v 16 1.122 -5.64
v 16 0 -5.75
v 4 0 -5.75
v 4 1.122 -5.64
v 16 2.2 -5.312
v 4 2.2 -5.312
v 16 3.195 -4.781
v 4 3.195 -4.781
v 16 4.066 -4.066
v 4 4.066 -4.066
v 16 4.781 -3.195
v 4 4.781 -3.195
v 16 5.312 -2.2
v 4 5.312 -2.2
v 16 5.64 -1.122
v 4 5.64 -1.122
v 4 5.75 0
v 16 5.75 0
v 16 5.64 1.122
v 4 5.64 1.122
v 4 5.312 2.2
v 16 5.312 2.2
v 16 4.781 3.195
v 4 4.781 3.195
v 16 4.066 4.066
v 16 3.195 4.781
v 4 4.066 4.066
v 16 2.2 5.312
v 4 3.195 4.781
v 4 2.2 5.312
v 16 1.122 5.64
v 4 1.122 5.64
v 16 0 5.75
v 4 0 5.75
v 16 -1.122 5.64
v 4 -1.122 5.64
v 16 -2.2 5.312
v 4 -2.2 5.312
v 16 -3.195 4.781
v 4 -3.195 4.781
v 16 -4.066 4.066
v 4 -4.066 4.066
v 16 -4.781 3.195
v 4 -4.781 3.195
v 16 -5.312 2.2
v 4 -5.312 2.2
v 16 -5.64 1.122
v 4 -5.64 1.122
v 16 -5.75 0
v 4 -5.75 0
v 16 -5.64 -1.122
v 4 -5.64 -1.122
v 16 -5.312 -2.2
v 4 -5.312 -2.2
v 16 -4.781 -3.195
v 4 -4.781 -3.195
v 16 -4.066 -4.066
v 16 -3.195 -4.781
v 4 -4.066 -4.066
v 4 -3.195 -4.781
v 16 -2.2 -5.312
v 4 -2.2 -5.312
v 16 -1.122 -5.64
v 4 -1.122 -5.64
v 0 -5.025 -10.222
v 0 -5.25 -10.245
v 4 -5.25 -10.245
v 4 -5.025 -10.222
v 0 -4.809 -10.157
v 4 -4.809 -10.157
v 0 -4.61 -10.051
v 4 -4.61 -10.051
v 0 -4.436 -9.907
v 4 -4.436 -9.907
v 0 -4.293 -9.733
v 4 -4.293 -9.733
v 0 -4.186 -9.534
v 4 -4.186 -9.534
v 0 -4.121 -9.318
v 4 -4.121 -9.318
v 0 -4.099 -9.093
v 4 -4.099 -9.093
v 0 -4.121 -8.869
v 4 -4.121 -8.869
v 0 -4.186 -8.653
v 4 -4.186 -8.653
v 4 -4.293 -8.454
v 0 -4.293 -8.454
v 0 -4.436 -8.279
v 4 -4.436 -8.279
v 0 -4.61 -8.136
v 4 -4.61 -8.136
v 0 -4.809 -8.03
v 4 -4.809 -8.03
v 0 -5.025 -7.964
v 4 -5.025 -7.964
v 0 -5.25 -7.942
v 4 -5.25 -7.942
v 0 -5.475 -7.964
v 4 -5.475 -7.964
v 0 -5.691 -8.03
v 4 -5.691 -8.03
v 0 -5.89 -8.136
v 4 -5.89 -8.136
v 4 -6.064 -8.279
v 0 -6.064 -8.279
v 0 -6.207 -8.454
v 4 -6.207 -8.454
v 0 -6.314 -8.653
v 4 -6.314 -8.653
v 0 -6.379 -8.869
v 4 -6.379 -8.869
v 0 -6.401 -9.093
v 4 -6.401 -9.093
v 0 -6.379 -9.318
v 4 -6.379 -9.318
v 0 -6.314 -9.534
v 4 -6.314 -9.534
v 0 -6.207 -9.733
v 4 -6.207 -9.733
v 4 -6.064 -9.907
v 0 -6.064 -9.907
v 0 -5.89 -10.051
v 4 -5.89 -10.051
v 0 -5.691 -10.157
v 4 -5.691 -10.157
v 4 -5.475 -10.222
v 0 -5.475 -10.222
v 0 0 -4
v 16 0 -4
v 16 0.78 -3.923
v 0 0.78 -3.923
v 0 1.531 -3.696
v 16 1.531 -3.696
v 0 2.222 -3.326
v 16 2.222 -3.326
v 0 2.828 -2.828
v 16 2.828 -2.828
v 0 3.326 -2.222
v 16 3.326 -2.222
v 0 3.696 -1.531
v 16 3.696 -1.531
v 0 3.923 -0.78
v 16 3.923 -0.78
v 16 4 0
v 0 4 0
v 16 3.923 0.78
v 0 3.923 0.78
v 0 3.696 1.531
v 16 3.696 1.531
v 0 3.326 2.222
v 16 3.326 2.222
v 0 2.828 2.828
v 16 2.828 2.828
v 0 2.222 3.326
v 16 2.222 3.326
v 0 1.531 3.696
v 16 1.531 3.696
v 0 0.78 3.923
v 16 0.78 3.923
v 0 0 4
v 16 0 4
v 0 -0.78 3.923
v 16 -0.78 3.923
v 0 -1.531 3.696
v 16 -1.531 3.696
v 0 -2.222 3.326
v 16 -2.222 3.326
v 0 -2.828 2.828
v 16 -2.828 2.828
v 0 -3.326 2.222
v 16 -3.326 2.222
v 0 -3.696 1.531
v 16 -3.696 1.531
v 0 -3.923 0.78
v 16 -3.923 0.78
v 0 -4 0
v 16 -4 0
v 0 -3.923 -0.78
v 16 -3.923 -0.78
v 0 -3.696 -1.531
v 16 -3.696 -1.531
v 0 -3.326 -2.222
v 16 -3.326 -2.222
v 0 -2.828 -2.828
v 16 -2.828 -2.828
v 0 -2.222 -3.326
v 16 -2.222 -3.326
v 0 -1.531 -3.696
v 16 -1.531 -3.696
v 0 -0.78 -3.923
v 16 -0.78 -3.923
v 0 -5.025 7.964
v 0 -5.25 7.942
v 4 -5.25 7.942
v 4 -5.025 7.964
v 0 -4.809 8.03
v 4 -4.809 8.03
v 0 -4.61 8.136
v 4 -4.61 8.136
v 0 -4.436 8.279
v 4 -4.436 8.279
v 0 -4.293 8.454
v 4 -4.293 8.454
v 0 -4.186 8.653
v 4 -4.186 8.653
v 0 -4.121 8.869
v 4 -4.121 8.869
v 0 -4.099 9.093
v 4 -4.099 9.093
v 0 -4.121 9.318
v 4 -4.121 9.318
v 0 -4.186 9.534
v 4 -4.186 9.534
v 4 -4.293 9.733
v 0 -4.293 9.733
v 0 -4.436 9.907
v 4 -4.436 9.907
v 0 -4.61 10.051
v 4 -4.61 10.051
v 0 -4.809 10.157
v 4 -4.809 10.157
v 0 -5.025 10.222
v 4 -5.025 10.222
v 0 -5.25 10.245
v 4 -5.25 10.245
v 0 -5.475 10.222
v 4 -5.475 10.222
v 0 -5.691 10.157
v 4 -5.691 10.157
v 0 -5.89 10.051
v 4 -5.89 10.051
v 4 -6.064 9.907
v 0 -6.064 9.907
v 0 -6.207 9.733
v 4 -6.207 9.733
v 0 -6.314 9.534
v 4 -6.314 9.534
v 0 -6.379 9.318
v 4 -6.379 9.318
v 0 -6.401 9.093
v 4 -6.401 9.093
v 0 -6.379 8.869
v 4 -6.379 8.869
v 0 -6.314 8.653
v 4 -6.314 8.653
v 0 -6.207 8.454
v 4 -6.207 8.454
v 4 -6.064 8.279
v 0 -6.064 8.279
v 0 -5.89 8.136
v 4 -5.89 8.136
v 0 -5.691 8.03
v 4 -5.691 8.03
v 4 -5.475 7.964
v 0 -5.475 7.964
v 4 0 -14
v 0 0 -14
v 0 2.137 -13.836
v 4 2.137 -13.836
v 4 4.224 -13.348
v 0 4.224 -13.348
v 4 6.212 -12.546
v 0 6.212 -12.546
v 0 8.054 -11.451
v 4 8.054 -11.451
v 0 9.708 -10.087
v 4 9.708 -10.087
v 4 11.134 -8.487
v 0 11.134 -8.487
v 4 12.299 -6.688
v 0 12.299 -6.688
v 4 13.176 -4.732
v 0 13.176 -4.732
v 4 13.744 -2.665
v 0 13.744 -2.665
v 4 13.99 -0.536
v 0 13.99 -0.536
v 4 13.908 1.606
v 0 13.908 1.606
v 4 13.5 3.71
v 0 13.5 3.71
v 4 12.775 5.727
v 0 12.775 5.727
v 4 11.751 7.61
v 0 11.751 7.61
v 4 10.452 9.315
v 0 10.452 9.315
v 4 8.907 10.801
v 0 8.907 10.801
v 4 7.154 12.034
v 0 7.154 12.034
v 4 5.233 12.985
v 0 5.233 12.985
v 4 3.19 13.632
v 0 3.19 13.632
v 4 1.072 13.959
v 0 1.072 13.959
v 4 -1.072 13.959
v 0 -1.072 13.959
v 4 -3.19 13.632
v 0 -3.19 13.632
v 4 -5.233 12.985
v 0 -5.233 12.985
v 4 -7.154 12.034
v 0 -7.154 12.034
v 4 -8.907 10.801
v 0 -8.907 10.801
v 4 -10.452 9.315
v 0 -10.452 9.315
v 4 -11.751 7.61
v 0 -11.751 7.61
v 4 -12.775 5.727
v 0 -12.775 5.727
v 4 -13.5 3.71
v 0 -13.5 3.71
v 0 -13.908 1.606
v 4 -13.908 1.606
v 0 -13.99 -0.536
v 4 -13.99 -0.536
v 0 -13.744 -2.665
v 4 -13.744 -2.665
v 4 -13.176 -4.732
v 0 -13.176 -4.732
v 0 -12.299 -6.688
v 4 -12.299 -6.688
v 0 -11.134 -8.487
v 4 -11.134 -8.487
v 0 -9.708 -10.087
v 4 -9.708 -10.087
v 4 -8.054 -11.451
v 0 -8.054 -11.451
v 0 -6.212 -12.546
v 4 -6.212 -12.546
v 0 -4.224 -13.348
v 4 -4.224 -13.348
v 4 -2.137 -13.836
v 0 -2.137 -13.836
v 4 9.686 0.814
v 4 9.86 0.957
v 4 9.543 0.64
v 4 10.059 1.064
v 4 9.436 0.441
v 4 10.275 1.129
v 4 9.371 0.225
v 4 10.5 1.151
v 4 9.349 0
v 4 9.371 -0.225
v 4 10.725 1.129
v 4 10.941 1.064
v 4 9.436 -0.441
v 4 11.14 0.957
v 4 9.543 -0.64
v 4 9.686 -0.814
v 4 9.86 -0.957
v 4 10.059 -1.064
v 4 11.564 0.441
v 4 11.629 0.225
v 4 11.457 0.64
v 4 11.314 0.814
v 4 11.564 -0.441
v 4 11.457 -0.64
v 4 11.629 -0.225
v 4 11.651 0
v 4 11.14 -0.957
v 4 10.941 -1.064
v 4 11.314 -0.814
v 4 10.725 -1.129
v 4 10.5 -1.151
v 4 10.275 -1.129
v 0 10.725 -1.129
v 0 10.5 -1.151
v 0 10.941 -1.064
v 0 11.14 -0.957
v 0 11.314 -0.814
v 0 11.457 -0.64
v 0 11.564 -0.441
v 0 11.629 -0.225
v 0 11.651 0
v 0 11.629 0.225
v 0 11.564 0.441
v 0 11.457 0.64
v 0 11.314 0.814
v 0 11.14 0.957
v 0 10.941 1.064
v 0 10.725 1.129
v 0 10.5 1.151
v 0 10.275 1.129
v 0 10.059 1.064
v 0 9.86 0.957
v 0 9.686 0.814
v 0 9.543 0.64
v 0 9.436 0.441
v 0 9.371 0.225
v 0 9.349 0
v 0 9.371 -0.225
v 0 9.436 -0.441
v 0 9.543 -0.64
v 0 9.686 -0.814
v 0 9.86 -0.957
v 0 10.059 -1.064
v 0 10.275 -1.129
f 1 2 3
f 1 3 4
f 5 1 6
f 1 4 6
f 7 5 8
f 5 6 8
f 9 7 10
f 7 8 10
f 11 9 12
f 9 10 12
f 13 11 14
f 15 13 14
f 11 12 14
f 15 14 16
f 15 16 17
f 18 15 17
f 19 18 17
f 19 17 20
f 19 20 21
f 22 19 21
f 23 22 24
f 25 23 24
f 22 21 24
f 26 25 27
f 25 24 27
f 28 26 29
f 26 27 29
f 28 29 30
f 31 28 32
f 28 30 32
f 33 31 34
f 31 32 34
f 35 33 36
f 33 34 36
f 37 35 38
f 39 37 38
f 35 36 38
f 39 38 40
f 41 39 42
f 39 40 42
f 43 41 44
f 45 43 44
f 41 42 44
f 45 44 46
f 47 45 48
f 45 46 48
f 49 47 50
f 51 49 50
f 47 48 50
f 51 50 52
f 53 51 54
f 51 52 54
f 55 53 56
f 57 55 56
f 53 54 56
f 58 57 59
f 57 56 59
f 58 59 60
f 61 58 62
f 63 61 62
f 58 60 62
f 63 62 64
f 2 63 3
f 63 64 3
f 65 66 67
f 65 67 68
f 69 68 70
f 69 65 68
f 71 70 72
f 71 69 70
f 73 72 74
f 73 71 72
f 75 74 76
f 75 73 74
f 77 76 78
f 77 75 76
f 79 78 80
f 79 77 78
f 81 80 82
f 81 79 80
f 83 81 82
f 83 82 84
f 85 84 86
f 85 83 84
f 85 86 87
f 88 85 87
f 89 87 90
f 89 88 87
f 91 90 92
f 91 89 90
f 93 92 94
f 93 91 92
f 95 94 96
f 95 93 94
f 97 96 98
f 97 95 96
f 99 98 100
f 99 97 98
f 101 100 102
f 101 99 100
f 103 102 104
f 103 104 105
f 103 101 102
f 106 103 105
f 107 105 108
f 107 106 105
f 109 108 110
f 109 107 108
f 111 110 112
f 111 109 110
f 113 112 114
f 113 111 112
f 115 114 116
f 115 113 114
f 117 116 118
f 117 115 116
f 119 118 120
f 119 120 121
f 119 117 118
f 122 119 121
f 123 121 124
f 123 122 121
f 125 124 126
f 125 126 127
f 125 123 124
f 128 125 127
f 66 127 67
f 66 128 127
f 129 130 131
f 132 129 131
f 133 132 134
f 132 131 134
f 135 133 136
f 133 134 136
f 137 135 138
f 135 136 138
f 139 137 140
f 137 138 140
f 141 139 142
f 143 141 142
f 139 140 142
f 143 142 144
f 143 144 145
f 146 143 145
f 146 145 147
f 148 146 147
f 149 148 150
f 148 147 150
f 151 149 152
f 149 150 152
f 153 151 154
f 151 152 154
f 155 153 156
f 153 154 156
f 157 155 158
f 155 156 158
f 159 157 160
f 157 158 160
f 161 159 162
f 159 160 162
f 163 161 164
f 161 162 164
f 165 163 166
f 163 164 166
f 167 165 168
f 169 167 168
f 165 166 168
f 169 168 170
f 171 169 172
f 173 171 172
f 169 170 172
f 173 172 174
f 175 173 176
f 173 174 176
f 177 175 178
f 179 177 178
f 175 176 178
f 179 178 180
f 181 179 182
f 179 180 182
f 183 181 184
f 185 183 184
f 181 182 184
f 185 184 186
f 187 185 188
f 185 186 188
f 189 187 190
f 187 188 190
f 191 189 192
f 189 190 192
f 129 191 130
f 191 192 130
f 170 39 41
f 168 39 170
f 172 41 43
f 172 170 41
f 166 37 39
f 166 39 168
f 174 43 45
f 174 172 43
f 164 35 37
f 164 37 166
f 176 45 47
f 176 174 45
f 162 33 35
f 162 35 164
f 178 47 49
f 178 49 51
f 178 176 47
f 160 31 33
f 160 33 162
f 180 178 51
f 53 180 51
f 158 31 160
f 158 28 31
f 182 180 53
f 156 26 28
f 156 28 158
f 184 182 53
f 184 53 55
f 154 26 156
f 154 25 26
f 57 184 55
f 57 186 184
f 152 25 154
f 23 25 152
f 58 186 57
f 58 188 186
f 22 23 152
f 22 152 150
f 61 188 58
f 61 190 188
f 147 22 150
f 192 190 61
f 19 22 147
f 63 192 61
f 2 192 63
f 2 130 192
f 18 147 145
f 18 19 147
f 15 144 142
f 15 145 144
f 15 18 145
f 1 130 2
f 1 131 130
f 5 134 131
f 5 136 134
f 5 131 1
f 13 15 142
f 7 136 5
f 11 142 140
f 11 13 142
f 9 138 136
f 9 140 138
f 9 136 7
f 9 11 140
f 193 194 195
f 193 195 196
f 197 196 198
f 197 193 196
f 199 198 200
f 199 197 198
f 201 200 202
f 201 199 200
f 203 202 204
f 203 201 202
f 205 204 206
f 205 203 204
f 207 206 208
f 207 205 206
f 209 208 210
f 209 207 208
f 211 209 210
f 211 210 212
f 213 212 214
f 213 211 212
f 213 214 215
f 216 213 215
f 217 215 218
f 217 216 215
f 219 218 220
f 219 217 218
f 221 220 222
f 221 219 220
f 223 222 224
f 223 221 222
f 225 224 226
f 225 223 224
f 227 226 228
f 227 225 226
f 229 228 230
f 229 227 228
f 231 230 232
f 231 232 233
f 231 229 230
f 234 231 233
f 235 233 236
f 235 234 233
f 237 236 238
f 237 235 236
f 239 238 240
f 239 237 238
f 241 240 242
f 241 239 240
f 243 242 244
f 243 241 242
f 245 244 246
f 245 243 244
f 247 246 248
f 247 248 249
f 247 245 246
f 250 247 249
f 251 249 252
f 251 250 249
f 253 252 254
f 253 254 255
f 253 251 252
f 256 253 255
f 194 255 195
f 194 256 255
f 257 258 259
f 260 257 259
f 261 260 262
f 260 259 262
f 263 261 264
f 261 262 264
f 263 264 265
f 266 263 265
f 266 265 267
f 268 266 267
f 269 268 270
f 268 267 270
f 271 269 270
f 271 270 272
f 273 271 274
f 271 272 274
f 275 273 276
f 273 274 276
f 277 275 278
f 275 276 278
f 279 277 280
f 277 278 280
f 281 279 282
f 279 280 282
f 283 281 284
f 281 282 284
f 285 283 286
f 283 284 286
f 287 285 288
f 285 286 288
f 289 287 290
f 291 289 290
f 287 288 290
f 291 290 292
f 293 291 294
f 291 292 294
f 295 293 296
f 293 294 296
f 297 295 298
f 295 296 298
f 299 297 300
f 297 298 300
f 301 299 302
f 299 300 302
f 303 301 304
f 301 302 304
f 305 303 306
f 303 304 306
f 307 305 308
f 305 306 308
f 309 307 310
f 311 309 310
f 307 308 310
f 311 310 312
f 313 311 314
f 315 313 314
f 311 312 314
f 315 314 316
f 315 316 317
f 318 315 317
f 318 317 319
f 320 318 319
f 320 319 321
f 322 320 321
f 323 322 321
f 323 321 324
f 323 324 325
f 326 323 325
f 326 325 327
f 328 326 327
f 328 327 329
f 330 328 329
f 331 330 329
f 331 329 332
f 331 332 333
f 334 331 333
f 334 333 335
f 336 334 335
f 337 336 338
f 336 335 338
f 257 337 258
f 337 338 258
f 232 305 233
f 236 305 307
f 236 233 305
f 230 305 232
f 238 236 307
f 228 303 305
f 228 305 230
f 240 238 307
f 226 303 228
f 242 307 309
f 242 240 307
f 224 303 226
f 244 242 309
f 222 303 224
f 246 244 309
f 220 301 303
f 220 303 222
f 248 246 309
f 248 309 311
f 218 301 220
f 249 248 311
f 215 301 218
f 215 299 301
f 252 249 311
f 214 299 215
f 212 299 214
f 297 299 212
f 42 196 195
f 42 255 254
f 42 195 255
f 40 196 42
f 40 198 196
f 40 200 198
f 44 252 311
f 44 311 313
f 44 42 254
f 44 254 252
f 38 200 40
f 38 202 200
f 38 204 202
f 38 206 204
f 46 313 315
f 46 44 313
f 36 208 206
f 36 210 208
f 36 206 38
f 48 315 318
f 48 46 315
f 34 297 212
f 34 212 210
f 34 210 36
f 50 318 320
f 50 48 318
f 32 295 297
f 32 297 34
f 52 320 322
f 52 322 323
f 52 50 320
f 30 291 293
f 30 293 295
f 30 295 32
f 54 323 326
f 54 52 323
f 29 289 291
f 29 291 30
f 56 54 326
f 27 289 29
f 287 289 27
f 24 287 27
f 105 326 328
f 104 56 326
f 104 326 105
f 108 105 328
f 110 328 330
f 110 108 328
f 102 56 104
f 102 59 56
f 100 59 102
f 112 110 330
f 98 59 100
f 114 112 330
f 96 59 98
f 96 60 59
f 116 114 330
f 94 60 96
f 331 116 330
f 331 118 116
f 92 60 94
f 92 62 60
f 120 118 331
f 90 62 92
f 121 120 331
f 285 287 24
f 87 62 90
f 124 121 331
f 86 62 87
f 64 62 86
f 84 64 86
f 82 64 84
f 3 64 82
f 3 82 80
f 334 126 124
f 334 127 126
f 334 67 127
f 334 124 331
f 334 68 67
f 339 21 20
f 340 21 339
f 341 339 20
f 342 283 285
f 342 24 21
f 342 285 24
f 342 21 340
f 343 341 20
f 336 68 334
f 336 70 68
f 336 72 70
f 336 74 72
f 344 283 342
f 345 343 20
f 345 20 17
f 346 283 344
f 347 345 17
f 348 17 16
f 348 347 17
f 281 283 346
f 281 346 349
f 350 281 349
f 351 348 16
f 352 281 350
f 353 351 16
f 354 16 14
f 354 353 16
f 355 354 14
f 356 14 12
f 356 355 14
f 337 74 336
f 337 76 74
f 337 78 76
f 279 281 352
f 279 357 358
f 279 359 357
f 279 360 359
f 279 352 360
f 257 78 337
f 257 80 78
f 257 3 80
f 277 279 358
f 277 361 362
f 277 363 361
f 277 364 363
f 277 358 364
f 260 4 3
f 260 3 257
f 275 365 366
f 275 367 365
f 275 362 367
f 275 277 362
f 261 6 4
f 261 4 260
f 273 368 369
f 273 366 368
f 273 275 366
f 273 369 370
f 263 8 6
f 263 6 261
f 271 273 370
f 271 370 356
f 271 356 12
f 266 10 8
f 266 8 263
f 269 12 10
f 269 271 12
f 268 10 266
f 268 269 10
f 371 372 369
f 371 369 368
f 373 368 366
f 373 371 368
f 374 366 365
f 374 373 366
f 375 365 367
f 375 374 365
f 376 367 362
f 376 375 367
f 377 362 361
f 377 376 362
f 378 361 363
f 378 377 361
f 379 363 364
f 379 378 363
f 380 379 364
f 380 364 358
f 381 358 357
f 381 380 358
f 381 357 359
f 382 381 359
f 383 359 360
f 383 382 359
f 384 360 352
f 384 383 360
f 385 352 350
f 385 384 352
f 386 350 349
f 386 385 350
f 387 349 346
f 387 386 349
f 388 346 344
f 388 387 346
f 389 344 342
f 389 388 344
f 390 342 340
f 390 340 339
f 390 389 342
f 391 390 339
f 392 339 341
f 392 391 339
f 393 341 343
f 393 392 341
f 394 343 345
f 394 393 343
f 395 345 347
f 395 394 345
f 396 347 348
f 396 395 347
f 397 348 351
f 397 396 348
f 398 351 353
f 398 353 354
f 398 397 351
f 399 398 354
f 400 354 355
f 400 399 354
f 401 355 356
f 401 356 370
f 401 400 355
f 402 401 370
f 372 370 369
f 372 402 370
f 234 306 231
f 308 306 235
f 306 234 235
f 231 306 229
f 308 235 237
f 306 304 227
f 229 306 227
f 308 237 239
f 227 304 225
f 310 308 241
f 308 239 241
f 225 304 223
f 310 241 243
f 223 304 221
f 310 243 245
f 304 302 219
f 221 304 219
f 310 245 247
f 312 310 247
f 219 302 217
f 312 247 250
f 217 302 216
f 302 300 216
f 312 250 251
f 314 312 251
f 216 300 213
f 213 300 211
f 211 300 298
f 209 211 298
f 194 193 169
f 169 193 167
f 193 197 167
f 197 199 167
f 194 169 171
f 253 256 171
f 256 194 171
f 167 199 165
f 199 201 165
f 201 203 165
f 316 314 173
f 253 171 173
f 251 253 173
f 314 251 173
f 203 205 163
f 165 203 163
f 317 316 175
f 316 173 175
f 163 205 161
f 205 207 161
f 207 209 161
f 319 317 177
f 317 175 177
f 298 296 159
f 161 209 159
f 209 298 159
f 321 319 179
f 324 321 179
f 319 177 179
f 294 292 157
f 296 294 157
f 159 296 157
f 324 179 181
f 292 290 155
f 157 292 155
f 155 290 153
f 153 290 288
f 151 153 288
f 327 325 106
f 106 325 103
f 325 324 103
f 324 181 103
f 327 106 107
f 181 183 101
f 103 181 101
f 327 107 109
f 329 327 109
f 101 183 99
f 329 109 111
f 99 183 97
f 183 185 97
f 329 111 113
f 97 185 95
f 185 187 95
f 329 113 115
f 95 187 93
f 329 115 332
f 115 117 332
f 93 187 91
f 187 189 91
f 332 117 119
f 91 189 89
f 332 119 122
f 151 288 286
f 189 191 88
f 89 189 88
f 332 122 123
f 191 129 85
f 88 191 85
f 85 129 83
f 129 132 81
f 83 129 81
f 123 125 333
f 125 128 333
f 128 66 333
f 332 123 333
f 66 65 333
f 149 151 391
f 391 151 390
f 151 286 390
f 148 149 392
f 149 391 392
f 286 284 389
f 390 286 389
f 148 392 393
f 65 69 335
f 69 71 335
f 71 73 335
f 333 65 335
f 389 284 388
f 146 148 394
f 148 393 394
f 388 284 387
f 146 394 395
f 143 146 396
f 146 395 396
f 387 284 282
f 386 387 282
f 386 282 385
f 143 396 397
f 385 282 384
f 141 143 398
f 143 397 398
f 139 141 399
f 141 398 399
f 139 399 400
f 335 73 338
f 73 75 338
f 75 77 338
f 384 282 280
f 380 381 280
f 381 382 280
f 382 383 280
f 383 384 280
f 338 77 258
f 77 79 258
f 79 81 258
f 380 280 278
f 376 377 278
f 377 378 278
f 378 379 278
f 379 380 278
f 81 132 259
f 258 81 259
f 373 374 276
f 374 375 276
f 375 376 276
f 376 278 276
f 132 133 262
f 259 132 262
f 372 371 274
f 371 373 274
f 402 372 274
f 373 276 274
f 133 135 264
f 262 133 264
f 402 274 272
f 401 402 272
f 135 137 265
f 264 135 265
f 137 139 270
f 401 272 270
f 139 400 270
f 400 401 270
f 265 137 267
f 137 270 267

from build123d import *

# Parameters (mm, degrees)
SKETCH_1_R          = 14
SKETCH_1_R_2        = 1.151350939
EXTRUDE_1_DEPTH     = 4
SKETCH_2_R          = 5.75
EXTRUDE_2_DEPTH     = 12
SKETCH_3_R          = 4
CUT_EXTRUDE_1_DEPTH = 16


with BuildPart() as part:
    # ｽｹｯﾁ1 → ﾎﾞｽ - 押し出し1 (new body)
    with BuildSketch(Plane(origin=(0, 0, 0), x_dir=(0, 0, -1), z_dir=(1, 0, 0))):
        Circle(SKETCH_1_R)
        with Locations((0, 10.5)):
            Circle(SKETCH_1_R_2, mode=Mode.SUBTRACT)
        with Locations((9.09326674, -5.25)):
            Circle(SKETCH_1_R_2, mode=Mode.SUBTRACT)
        with Locations((-9.09326674, -5.25)):
            Circle(SKETCH_1_R_2, mode=Mode.SUBTRACT)
    extrude(amount=EXTRUDE_1_DEPTH)

    # ｽｹｯﾁ2 → ﾎﾞｽ - 押し出し2 (add)
    with BuildSketch(Plane(origin=(4, 0, 0), x_dir=(0, 0, -1), z_dir=(1, 0, 0))):
        Circle(SKETCH_2_R)
    extrude(amount=EXTRUDE_2_DEPTH)

    # ｽｹｯﾁ3 → ｶｯﾄ - 押し出し1 (cut)
    with BuildSketch(Plane(origin=(16, 0, 0), x_dir=(0, 0, -1), z_dir=(1, 0, 0))):
        Circle(SKETCH_3_R)
    extrude(amount=-CUT_EXTRUDE_1_DEPTH, mode=Mode.SUBTRACT)


solid = part.part
